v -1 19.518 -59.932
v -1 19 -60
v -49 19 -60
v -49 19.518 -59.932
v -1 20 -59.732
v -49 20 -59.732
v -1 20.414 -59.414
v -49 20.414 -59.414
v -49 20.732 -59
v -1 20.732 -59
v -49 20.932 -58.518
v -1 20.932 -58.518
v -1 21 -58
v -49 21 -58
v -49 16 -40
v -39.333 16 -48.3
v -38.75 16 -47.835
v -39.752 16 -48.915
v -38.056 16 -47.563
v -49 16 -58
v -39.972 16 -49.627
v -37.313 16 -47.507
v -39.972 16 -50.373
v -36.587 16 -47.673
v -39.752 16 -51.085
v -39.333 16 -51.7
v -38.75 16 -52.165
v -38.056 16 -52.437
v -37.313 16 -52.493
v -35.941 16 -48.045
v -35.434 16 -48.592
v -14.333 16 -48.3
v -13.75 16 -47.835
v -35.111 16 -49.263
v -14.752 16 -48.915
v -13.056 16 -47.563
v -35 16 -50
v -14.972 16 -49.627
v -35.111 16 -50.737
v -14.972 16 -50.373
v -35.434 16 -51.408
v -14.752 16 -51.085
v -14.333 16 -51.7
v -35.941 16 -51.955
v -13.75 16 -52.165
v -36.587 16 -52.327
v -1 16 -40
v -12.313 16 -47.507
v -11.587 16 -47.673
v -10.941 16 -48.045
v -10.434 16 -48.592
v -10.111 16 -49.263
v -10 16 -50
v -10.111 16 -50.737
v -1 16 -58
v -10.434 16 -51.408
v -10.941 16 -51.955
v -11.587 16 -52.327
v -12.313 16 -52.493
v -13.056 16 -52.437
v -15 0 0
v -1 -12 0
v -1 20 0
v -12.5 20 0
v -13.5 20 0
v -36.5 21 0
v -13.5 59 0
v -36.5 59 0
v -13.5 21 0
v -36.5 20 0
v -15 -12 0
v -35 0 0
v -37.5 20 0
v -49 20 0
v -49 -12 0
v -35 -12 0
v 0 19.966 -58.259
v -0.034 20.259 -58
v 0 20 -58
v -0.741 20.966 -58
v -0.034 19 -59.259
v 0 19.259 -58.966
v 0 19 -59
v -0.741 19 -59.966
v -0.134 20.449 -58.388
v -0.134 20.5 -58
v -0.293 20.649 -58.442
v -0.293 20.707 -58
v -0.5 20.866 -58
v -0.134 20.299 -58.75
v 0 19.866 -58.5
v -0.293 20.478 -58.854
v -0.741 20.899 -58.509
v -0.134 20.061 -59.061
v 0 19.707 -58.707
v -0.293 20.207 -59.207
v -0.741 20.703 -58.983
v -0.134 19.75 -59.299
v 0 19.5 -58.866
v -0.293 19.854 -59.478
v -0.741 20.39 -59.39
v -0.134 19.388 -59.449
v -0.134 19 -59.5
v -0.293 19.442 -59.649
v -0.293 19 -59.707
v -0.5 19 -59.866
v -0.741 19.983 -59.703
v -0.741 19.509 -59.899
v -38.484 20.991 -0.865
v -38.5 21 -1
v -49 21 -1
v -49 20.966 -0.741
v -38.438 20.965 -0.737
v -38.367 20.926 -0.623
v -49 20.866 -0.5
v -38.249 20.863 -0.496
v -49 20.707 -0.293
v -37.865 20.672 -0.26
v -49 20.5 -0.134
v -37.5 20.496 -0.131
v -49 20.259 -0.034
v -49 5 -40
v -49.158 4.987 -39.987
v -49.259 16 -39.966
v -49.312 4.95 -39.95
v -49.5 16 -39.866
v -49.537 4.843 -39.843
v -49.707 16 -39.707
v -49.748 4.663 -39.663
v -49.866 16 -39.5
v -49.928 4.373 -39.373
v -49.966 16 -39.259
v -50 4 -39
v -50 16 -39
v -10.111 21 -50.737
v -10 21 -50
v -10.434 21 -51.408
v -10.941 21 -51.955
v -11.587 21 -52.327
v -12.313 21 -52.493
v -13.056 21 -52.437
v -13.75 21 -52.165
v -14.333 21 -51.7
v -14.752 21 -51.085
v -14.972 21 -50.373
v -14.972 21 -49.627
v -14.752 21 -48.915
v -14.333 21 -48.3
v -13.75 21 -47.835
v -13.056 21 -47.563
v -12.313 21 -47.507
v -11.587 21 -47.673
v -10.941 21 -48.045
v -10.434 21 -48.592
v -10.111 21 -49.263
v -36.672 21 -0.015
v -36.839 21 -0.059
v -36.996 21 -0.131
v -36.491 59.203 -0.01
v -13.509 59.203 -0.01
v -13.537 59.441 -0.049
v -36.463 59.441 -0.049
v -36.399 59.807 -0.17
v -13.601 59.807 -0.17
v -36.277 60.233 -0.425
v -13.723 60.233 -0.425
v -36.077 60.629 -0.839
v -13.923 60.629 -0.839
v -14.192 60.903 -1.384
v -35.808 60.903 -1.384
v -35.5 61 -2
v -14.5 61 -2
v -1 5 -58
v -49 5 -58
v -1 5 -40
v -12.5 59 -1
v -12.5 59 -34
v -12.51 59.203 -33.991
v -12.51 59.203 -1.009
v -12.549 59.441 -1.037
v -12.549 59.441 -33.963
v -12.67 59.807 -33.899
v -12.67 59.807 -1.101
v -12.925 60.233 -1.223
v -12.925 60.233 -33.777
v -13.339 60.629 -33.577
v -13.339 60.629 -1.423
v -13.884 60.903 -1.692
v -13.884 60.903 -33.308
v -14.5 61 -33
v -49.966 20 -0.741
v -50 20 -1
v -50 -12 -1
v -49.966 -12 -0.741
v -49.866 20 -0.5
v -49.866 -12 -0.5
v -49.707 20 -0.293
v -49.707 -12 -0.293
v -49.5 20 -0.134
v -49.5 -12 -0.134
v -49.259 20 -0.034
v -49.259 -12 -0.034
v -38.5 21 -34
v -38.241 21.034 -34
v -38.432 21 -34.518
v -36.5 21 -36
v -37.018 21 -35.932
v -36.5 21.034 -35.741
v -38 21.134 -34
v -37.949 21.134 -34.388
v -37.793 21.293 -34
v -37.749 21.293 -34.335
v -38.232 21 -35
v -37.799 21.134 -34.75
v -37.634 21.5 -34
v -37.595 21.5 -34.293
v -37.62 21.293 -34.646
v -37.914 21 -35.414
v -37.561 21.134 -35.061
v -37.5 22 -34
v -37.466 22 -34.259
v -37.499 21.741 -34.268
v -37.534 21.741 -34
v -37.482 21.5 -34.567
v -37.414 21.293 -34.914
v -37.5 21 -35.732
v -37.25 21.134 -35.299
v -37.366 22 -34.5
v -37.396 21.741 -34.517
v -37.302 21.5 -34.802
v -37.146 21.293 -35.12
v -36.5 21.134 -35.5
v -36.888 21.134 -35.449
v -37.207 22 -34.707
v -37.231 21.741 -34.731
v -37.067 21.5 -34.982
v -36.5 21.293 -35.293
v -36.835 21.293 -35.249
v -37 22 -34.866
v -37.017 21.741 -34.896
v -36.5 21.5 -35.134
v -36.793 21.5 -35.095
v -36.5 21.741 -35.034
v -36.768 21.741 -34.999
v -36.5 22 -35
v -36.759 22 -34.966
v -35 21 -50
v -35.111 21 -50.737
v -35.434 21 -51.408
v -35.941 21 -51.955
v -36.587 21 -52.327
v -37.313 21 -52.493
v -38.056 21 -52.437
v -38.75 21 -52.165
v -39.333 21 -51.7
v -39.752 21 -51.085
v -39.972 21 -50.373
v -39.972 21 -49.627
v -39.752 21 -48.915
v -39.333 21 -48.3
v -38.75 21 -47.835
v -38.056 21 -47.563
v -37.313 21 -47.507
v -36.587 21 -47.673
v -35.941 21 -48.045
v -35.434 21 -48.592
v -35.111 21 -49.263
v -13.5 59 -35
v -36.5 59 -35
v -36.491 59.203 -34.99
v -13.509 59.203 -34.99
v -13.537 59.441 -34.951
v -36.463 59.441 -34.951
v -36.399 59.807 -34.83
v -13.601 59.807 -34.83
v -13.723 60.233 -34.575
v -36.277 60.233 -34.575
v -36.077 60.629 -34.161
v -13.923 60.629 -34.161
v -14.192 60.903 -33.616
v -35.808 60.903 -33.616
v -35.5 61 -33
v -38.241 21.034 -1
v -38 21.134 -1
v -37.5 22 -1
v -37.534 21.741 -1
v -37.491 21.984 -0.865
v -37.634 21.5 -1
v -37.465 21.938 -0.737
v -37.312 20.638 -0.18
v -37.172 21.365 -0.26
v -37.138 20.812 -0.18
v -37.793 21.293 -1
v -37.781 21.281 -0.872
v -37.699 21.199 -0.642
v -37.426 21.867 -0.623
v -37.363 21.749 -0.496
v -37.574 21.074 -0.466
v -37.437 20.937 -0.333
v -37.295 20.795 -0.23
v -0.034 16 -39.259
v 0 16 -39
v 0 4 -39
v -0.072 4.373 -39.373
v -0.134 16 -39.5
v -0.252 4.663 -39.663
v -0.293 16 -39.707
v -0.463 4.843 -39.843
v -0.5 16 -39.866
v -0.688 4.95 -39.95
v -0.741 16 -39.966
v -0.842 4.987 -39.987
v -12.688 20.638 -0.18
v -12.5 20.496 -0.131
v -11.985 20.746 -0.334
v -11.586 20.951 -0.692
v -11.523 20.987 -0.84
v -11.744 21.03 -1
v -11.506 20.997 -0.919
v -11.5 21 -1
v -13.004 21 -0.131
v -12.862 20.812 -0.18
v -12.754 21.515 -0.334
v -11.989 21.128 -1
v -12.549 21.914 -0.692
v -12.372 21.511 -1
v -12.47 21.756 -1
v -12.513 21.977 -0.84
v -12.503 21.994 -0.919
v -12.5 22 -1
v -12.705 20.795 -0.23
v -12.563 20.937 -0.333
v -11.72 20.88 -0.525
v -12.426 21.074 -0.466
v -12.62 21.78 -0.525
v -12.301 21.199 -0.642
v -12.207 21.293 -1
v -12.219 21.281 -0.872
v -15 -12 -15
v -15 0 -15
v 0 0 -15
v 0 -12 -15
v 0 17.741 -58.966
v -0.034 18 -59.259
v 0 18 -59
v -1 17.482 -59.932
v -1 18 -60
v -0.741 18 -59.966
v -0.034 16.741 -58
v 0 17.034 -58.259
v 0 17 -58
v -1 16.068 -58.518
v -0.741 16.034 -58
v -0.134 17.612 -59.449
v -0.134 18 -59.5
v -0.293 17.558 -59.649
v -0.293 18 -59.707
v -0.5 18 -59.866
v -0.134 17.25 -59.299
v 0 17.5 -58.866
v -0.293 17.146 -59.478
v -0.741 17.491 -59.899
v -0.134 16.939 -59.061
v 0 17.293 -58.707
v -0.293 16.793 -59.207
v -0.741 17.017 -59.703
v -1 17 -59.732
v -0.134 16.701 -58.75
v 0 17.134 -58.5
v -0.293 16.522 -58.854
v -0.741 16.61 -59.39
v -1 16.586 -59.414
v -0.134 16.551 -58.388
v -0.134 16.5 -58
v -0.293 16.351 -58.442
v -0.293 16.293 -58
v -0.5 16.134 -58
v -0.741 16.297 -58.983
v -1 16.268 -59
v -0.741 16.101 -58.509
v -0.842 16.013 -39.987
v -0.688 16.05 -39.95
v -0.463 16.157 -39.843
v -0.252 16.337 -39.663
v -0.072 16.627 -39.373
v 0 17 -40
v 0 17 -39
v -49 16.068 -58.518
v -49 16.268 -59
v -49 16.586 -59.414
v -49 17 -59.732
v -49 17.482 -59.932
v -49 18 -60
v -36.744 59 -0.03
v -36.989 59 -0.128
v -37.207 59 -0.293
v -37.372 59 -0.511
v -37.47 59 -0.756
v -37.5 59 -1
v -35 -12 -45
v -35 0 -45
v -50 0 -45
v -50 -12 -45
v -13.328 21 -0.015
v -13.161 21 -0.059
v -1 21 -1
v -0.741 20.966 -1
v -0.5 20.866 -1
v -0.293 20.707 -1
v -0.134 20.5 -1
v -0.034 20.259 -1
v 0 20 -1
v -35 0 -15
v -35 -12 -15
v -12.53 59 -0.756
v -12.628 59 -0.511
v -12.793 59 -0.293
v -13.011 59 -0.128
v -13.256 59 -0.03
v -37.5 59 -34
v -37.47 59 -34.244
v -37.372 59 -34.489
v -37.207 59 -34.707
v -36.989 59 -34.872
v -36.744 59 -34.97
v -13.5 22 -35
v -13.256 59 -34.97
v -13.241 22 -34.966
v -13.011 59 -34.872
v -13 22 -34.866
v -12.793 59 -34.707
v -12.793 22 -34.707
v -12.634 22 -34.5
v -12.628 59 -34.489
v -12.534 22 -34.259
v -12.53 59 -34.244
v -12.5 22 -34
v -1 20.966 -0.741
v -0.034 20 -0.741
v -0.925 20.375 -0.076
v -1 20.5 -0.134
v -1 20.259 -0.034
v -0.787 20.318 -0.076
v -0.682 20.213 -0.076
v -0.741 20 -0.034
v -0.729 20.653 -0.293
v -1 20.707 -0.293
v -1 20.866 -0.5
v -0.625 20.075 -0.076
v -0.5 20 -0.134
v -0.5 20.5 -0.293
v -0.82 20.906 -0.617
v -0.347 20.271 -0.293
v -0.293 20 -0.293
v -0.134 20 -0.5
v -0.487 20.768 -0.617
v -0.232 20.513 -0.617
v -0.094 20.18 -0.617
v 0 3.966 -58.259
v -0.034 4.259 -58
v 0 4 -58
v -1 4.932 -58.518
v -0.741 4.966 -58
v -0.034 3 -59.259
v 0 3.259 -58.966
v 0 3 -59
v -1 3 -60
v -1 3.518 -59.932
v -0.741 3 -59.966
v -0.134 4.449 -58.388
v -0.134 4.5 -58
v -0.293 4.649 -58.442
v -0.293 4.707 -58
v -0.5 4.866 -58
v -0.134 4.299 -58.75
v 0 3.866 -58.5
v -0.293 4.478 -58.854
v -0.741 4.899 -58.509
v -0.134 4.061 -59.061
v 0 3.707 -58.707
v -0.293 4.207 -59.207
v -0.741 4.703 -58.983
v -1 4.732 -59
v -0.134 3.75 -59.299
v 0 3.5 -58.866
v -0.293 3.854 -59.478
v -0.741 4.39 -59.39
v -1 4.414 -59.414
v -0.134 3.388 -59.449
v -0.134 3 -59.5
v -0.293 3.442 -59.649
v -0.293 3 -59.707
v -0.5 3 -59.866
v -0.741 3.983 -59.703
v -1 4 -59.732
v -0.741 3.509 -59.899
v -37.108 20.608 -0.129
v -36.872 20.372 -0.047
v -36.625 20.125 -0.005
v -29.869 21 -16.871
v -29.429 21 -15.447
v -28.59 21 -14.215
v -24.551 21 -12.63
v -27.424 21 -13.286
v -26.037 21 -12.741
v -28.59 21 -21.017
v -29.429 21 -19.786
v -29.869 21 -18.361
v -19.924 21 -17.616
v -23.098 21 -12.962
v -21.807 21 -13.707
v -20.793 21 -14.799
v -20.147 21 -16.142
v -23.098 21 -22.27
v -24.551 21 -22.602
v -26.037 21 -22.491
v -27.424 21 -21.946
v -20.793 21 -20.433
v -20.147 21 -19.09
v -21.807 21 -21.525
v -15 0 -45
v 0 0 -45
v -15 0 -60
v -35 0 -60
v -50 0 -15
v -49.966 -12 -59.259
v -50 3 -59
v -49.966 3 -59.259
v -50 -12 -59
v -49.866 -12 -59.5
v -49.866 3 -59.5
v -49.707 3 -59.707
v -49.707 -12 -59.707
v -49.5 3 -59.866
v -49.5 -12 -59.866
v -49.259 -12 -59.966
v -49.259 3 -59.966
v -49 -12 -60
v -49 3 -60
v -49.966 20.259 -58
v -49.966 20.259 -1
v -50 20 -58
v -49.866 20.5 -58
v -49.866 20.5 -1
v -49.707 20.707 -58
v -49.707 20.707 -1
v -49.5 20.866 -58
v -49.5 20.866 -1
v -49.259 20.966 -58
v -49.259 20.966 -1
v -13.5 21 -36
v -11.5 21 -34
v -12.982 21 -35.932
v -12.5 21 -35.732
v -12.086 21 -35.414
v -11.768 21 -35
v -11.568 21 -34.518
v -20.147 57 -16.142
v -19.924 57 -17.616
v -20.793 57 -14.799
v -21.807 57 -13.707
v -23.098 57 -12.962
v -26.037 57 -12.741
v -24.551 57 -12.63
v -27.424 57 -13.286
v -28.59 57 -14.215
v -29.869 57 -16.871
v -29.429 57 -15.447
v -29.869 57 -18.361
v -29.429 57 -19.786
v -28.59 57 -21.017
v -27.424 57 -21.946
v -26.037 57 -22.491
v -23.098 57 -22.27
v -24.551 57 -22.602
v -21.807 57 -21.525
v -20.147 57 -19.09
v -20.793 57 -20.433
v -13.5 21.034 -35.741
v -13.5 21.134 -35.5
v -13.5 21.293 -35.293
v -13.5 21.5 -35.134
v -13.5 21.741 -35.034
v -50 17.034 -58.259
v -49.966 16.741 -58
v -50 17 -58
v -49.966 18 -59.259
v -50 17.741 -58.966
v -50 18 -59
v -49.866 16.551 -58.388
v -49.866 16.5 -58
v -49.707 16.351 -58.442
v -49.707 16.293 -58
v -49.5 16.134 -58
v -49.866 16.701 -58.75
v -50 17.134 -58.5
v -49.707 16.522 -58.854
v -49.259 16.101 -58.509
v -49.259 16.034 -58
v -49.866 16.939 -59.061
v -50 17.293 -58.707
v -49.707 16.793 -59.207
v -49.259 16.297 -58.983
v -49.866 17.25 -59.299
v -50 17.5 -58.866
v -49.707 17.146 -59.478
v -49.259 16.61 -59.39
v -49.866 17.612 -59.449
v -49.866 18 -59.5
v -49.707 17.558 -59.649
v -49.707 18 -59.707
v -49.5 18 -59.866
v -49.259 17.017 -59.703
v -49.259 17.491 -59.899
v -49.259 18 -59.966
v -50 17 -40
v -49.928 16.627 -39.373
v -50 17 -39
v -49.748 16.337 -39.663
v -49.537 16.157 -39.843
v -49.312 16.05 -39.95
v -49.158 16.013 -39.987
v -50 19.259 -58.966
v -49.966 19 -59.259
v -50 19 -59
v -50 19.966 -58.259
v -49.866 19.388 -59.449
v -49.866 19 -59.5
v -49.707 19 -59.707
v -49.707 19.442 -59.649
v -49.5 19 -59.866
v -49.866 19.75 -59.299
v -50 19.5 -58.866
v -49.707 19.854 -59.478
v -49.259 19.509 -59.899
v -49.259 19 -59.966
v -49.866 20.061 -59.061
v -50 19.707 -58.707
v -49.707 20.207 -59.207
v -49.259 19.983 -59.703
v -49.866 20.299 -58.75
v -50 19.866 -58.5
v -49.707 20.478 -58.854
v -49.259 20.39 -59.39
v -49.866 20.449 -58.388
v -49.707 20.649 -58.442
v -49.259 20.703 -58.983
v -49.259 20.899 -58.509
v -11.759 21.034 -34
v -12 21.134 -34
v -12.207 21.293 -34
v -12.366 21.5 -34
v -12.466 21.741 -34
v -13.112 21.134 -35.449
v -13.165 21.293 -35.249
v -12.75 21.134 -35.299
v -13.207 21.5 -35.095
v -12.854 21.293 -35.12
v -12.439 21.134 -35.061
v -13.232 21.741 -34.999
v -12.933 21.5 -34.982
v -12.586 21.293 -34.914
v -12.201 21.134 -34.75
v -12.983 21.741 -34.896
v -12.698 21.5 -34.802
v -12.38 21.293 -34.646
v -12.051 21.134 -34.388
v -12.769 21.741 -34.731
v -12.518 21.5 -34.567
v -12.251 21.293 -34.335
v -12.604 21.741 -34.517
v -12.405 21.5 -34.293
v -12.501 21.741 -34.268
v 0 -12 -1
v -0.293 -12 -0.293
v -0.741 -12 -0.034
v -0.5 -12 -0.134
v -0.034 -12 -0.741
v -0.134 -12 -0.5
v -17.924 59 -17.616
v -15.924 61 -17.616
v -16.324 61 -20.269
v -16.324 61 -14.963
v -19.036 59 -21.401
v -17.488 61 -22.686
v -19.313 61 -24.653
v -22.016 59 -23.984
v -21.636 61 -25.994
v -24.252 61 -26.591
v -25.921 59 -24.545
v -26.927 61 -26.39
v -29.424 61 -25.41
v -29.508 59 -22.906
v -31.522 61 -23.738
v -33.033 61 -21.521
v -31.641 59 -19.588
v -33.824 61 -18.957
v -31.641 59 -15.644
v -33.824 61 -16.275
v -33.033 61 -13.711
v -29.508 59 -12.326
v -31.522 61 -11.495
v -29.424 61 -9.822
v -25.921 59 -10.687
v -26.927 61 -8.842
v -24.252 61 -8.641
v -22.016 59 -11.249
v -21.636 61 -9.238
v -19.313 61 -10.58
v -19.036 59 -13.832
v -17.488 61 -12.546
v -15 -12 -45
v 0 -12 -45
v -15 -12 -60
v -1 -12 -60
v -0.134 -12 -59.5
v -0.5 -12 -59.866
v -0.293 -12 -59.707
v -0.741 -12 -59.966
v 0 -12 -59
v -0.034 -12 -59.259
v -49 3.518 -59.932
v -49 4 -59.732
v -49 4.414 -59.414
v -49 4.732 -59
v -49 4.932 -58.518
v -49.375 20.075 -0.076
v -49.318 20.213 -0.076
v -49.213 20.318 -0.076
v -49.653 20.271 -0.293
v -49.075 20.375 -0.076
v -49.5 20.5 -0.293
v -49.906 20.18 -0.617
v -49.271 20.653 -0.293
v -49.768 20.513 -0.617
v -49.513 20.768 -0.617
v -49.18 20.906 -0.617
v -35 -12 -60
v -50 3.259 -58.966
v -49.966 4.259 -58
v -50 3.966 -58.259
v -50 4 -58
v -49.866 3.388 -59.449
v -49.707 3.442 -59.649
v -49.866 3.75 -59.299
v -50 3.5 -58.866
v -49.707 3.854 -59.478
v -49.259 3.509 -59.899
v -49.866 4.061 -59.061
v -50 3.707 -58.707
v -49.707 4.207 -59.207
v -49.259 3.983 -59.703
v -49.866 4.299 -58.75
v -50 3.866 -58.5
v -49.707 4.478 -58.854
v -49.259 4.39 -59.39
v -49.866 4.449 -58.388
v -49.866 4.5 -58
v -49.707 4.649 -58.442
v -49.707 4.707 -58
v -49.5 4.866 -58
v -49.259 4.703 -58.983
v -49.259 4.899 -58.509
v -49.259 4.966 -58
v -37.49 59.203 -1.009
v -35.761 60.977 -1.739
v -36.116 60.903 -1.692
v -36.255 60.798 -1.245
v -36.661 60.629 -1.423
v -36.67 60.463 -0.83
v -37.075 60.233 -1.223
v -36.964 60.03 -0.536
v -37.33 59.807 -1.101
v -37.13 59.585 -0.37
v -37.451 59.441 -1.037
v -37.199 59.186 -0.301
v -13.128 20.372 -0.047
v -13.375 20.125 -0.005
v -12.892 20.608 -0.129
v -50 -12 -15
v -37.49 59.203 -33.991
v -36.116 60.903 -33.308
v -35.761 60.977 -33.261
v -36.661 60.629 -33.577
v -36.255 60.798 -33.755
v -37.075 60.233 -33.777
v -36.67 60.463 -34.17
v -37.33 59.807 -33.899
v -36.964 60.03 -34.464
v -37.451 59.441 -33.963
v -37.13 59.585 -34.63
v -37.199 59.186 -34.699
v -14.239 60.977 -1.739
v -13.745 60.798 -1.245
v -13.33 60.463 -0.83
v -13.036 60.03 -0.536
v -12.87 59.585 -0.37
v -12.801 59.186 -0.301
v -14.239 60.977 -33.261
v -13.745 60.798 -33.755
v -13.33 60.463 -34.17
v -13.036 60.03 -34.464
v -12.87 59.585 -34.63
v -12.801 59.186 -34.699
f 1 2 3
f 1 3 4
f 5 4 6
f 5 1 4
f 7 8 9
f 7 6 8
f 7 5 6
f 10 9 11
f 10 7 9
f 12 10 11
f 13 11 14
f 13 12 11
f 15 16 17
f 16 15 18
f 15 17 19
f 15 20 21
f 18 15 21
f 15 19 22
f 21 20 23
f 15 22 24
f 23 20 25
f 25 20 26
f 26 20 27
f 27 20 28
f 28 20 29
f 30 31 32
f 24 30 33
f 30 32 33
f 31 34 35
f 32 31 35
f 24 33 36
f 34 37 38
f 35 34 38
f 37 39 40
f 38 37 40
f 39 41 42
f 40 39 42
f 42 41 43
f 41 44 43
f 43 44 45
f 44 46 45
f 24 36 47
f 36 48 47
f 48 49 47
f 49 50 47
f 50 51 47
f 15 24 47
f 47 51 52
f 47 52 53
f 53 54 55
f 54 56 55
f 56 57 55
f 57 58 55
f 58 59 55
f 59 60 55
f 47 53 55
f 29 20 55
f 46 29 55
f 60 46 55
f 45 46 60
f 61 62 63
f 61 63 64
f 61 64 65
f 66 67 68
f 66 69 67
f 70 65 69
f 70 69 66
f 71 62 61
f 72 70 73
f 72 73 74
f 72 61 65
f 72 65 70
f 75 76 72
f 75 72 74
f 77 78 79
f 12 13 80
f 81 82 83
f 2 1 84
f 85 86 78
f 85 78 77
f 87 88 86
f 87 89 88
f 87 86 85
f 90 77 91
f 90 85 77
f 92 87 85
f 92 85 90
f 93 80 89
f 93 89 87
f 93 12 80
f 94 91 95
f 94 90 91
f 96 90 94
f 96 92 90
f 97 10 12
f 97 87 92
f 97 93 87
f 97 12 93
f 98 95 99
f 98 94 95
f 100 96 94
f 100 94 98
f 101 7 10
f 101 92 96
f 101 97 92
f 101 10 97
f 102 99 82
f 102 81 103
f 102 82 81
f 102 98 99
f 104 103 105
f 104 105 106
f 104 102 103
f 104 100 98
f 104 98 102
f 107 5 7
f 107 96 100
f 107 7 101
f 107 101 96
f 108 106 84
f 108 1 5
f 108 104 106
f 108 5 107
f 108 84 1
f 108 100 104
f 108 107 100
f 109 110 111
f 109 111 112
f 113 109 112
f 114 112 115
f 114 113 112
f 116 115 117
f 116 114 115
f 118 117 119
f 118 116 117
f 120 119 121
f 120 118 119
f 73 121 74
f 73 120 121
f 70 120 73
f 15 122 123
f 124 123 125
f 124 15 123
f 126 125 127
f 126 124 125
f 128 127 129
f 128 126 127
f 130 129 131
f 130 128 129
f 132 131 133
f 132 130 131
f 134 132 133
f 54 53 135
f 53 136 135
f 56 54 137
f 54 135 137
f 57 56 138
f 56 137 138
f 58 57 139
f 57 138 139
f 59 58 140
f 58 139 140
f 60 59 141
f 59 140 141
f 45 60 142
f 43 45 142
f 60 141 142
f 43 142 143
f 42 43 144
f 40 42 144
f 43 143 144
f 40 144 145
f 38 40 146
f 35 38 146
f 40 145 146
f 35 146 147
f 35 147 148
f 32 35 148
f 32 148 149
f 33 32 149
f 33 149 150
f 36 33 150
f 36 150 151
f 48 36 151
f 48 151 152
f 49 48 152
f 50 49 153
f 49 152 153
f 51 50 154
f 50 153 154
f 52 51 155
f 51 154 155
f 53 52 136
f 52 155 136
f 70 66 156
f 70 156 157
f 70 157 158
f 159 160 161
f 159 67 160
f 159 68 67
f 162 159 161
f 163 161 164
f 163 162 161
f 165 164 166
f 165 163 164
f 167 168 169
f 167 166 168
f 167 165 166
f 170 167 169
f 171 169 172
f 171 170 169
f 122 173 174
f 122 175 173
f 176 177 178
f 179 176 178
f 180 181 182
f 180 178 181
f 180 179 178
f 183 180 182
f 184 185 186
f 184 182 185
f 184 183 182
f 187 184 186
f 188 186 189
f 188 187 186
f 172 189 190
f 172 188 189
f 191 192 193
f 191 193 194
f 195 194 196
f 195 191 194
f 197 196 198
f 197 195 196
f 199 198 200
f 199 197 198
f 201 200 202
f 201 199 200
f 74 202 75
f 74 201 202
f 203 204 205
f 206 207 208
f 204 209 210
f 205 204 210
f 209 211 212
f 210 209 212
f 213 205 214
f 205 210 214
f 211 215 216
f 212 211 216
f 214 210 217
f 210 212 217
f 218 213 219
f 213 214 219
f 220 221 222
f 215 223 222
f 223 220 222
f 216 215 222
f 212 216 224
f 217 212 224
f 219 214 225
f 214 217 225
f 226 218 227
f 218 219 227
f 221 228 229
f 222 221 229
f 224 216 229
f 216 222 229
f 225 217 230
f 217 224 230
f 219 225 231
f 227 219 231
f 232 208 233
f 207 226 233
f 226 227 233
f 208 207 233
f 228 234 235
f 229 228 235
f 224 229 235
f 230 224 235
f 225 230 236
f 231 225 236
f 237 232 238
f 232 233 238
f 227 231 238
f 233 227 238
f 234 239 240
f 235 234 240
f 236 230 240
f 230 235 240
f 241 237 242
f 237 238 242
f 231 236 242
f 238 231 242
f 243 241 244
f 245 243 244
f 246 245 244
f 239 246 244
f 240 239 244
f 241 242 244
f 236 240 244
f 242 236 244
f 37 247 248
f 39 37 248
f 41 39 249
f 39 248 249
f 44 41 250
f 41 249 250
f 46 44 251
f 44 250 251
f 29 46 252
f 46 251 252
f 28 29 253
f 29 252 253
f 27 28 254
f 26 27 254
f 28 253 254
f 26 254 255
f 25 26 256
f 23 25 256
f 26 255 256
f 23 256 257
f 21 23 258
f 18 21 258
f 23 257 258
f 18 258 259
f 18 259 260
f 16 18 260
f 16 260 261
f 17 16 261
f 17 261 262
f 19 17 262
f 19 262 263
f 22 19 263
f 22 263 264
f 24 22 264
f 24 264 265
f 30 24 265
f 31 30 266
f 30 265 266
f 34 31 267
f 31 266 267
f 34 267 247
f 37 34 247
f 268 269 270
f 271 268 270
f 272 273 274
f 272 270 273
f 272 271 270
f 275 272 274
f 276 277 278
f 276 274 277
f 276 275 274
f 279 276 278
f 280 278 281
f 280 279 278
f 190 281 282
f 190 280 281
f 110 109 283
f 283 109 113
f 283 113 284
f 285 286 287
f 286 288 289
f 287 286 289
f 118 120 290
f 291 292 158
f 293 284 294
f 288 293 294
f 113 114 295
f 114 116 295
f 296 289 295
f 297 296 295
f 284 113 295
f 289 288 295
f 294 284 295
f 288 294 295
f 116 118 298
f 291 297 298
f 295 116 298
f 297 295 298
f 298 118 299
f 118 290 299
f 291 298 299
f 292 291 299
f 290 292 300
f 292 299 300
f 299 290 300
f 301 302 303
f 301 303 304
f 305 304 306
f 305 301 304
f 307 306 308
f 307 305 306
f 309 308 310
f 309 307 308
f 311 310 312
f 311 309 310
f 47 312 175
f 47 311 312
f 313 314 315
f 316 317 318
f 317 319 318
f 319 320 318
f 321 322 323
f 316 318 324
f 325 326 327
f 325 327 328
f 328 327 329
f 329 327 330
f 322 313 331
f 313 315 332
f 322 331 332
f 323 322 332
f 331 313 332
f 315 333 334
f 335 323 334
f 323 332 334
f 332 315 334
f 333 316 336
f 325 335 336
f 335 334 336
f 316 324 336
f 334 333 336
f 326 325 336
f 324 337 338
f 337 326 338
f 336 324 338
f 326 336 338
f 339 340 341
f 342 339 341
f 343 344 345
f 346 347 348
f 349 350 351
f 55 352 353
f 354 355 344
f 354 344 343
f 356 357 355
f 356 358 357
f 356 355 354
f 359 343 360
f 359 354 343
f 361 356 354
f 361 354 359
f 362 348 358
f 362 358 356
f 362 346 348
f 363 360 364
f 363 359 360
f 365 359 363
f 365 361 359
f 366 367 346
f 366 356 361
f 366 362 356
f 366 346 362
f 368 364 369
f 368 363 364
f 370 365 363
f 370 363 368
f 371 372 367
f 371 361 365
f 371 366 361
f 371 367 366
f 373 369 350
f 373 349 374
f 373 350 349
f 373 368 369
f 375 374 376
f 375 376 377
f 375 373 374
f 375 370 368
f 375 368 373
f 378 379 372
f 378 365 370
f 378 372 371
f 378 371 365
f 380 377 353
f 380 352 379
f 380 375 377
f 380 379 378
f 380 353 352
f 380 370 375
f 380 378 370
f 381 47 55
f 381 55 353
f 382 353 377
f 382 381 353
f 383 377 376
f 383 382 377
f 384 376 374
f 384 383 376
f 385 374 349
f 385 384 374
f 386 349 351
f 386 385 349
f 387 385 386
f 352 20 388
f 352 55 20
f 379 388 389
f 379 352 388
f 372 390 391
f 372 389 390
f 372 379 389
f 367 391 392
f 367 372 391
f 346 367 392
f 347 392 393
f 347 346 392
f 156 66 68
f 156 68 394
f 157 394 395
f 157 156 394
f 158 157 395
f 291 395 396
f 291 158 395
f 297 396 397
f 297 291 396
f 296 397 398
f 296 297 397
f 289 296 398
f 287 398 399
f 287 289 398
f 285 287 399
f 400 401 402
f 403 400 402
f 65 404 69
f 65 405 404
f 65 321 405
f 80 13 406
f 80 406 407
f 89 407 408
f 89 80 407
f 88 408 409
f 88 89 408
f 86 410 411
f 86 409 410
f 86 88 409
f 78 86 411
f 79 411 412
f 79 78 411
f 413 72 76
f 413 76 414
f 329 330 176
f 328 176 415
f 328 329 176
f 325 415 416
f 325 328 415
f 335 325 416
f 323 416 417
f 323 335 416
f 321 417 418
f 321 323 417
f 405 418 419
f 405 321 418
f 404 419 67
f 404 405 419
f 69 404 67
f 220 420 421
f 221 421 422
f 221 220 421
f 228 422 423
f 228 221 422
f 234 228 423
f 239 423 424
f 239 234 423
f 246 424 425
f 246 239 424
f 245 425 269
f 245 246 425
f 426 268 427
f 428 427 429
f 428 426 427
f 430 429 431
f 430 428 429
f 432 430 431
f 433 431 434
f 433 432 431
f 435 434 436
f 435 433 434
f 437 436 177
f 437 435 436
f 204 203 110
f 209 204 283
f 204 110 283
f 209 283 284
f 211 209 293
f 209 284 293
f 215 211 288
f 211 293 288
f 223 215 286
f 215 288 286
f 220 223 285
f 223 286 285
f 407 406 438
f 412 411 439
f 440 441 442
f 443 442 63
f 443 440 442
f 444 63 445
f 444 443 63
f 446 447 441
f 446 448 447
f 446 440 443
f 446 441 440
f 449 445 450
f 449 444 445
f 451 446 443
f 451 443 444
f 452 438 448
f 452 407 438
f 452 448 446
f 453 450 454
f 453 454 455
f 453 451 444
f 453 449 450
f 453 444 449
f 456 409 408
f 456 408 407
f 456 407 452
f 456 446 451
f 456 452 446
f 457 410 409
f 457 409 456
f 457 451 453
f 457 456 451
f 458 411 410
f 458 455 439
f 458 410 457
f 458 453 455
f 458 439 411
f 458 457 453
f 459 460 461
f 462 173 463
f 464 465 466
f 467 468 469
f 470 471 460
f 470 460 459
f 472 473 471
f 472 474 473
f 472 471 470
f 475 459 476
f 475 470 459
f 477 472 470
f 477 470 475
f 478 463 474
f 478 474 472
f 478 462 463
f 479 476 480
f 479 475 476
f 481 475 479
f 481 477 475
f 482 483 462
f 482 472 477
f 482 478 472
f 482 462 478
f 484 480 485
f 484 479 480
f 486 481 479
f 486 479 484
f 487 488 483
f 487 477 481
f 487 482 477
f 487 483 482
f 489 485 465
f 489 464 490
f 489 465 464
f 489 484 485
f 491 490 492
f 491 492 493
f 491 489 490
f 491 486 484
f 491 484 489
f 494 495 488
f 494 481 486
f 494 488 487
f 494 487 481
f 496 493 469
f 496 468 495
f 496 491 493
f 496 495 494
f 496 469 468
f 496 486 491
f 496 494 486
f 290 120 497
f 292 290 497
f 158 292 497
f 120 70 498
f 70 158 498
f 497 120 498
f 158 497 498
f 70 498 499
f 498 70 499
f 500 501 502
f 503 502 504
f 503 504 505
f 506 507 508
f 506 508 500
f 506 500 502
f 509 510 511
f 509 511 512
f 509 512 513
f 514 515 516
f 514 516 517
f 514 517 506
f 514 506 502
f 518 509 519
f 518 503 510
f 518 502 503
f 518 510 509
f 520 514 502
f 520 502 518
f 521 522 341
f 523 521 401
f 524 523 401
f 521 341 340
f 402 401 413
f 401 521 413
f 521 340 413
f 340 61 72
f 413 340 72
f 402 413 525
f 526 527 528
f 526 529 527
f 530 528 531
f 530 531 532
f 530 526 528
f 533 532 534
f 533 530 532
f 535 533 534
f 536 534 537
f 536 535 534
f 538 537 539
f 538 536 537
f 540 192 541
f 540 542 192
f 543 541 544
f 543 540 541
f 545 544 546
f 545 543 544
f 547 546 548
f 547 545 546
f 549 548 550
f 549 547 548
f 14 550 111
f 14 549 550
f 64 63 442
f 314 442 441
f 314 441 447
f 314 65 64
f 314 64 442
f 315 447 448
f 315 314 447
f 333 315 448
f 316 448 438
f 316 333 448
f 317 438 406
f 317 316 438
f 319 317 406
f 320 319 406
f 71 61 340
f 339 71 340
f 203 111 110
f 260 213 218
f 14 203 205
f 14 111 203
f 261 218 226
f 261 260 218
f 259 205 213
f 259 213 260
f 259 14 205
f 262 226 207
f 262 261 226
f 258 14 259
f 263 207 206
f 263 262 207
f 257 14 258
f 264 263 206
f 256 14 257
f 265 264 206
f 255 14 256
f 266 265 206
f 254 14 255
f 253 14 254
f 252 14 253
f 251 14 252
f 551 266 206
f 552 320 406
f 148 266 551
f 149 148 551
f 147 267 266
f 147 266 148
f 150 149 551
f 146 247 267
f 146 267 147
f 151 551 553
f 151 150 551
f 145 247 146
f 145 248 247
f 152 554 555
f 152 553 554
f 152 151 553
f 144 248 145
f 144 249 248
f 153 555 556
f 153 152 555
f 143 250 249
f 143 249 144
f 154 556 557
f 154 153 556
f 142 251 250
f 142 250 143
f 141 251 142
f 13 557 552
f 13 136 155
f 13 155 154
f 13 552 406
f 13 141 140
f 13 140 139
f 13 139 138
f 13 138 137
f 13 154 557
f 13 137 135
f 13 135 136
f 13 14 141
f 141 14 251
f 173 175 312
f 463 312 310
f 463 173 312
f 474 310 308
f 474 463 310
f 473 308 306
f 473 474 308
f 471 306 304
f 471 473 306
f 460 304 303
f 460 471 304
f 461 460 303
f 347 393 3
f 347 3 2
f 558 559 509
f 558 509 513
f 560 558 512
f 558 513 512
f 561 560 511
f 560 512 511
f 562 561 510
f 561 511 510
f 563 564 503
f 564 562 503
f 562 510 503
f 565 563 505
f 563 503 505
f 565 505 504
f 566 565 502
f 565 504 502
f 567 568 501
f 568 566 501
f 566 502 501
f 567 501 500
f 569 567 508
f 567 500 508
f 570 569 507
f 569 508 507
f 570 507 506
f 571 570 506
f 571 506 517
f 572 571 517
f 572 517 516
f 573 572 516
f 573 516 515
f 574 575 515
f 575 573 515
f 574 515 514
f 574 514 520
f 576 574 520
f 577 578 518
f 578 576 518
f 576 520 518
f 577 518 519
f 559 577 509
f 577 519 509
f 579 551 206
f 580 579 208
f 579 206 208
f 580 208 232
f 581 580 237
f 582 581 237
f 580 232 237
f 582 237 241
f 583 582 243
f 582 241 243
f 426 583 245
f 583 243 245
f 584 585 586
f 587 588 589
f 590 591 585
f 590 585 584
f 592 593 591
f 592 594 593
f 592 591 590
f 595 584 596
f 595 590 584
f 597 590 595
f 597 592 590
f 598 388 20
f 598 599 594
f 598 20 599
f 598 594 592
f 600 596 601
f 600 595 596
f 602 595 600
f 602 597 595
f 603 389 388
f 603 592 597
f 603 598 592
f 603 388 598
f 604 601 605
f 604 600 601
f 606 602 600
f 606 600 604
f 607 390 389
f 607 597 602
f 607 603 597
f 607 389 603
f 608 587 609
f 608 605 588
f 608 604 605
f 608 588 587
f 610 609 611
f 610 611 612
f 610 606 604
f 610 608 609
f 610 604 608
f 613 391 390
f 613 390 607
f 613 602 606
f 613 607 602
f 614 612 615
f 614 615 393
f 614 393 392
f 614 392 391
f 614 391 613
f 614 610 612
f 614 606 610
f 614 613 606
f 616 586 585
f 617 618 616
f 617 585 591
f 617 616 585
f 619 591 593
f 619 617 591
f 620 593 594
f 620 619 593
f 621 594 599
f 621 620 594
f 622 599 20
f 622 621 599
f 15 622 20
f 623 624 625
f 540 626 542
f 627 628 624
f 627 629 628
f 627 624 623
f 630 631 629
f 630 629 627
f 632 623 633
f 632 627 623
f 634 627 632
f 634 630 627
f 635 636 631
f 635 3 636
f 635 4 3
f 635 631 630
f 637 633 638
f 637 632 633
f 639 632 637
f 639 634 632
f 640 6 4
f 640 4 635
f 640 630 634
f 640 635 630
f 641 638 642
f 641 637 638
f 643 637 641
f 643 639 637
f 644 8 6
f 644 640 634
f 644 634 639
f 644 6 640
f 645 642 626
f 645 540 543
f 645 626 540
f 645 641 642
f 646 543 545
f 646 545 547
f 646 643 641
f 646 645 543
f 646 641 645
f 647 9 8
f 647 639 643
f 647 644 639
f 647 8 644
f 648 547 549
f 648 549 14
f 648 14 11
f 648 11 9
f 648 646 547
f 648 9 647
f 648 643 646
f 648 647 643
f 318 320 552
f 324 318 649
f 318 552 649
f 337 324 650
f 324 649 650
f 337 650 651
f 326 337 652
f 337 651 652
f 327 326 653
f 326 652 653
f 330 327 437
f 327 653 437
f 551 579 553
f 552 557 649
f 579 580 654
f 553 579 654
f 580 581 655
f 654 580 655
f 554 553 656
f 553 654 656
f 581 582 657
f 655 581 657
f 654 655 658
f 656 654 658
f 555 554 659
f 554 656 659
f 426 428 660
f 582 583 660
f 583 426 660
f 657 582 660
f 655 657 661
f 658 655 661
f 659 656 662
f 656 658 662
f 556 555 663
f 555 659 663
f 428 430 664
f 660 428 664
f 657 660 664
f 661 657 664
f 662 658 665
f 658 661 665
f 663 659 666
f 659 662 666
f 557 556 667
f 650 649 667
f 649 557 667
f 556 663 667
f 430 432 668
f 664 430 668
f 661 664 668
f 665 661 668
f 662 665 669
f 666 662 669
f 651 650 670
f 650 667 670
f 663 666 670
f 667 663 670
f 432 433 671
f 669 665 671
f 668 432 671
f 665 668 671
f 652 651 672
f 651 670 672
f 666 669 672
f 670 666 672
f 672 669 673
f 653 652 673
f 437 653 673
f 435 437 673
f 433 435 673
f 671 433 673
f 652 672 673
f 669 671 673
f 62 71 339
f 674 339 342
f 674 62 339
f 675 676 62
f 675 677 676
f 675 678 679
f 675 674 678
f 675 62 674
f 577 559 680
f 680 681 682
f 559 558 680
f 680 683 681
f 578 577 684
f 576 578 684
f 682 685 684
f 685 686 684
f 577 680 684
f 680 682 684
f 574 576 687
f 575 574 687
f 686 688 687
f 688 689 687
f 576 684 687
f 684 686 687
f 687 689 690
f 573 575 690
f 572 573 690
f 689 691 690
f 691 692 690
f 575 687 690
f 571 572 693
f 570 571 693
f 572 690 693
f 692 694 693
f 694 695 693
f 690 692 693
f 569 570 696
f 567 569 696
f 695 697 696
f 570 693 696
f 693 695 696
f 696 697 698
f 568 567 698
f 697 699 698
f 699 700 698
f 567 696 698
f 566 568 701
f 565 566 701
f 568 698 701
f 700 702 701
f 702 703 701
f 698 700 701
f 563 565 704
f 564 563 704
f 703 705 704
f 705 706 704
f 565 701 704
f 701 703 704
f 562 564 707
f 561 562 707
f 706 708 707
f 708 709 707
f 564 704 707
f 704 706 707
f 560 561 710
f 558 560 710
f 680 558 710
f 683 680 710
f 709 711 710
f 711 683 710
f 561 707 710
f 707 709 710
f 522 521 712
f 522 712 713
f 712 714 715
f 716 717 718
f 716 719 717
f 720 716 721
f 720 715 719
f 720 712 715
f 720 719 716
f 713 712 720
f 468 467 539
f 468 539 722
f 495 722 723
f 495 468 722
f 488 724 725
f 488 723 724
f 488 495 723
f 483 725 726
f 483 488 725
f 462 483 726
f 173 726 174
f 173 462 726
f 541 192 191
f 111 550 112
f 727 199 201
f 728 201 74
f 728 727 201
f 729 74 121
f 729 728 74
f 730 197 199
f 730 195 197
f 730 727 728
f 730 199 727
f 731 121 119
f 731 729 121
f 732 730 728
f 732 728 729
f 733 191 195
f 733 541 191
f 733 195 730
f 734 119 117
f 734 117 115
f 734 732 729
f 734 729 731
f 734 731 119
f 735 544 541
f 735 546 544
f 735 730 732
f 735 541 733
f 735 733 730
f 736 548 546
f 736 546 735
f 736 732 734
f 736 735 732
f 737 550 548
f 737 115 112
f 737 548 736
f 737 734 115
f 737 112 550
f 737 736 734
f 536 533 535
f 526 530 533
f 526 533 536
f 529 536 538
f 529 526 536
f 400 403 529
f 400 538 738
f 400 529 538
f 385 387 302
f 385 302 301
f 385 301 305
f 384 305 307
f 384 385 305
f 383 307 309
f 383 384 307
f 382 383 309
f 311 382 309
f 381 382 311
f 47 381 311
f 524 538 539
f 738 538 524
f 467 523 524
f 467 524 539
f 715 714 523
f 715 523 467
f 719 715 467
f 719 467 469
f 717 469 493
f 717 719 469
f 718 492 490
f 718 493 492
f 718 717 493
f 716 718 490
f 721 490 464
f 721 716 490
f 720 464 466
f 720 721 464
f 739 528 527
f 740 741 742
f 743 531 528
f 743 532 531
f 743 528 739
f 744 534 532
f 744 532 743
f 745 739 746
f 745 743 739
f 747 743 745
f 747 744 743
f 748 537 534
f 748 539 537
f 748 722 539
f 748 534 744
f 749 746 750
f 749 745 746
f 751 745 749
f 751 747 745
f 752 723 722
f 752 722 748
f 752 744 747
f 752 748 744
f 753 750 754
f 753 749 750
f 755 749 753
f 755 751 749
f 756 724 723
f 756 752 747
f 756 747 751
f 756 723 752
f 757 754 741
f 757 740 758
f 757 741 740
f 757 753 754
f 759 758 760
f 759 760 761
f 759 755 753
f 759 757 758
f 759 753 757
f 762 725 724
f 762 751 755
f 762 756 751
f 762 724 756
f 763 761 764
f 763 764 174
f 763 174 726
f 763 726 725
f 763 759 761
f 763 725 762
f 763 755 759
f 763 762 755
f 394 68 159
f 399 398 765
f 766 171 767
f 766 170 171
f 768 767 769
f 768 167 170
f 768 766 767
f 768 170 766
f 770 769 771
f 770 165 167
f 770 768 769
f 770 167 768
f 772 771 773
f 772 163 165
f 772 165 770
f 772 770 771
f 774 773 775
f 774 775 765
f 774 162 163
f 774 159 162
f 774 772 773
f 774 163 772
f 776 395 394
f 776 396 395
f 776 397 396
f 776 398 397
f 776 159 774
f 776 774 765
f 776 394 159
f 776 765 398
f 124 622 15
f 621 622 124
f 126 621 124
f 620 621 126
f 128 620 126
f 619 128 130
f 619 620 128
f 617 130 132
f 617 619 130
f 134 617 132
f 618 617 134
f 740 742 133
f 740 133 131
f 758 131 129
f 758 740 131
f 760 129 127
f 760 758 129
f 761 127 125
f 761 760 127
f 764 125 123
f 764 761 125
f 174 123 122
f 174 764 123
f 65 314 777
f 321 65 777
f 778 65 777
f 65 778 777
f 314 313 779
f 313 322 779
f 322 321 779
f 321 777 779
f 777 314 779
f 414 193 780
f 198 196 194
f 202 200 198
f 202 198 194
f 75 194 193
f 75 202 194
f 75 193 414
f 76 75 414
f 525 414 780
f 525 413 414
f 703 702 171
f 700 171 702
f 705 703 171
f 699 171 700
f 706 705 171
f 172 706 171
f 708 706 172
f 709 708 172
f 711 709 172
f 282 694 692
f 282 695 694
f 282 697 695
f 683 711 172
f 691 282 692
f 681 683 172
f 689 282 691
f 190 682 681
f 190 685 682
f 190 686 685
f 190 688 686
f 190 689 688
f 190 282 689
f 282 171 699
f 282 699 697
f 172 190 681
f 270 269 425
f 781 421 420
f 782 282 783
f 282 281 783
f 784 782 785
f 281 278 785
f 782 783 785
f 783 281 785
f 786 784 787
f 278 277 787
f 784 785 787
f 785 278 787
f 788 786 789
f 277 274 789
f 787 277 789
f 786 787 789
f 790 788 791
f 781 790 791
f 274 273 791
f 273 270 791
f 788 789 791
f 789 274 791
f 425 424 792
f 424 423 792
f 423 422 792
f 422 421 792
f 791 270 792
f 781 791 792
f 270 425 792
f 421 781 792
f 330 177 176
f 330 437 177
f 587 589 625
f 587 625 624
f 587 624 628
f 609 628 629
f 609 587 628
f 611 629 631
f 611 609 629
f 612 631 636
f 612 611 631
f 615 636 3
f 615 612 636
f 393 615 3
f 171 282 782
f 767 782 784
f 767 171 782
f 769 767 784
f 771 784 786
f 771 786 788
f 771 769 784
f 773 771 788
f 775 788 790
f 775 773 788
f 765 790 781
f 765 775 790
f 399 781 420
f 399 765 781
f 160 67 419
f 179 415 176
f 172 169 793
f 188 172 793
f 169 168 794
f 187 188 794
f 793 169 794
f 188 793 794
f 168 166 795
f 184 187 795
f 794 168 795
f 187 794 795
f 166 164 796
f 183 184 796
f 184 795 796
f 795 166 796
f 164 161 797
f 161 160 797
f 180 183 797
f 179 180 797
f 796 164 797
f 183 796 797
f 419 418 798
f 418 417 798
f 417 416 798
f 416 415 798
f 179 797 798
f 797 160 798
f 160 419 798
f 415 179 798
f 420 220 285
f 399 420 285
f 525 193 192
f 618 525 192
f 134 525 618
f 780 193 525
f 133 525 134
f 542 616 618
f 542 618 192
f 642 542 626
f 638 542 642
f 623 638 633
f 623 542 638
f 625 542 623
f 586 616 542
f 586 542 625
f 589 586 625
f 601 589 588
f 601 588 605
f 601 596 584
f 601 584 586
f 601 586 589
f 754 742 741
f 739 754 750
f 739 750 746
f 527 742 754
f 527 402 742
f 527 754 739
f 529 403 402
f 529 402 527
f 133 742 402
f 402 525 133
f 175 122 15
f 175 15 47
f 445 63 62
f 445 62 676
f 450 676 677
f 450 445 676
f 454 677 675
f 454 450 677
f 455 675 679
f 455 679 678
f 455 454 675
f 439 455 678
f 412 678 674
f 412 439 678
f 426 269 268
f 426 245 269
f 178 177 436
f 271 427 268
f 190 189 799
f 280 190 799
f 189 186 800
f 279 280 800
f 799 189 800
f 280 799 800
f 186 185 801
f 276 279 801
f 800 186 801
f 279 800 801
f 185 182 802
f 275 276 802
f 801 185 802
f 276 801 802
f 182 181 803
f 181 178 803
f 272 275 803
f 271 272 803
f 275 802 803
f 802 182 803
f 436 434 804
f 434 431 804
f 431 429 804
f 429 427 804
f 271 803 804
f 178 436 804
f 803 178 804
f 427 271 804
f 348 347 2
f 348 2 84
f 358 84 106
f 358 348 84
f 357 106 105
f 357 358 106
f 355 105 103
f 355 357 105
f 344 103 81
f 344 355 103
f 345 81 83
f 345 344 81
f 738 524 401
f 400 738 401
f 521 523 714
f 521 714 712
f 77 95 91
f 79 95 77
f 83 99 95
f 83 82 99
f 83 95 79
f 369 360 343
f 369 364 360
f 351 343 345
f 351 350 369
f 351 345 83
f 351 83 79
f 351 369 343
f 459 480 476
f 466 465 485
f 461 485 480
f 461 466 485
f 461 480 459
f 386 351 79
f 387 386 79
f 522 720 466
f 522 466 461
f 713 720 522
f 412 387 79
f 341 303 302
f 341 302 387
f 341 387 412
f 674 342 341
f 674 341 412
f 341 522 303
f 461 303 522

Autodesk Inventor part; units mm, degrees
ref_plane "YZ Plane" through (0, 0, 0) normal (1, 0, 0) x (0, 1, 0)
ref_plane "XZ Plane" through (0, 0, 0) normal (0, 1, 0) x (-1, 0, 0)
ref_plane "XY Plane" through (0, 0, 0) normal (0, 0, 1) x (1, 0, 0)
sketch "Sketch1" plane through (0, 0, 0) normal (0, 1, 0) x (-1, 0, 0)
  line L0 (0, 0) -> (50, 0)
  line L1 (50, 0) -> (50, -60)
  line L2 (50, -60) -> (0, -60)
  line L3 (0, -60) -> (0, 0)
  dimension "d0" = 50
  dimension "d1" = 60
extrude "Extrusion1" add sketch "Sketch1" along normal blind 5
sketch "Sketch2" plane through (0, 5, 0) normal (0, 1, 0) x (1, 0, 0)
  line L0 (-50, 0) -> (0, 0) projected
  line L1 (-50, 60) -> (-50, 0) projected
  line L2 (0, 0) -> (-50, 0)
  line L3 (-50, 0) -> (-50, 40)
  line L4 (-50, 40) -> (0, 40)
  line L5 (0, 40) -> (0, 0)
  dimension "d4" = 40
extrude "Extrusion2" add sketch "Sketch2" along normal blind 11
sketch "Sketch3" plane through (0, 16, 0) normal (0, 1, 0) x (1, 0, 0)
  line L0 (0, 0) -> (-50, 0)
  line L1 (-50, 0) -> (-50, 60)
  line L2 (-50, 60) -> (0, 60)
  line L3 (0, 60) -> (0, 0)
extrude "Extrusion3" add sketch "Sketch3" along normal blind 5
sketch "Sketch4" plane through (0, 21, 0) normal (0, 1, 0) x (1, 0, 0)
  line L0 (0, 0) -> (0, 60) projected
  line L1 (-50, 40) -> (0, 40) projected
  line L2 (0, 60) -> (-50, 60)
  line L3 (-50, 60) -> (-50, 40)
  line L4 (-50, 40) -> (0, 40)
  line L5 (0, 40) -> (0, 60)
  line L6 (-50, 50) -> (0, 50)
  line L7 (-25, 50) -> (-50, 50)
  line L8 (-25, 50) -> (0, 50)
  circle A0 centre (-12.5, 50) radius 2.5
  circle A1 centre (-37.5, 50) radius 2.5
  dimension "d9" = 5
  dimension "d10" = 5
extrude "Extrusion4" cut sketch "Sketch4" against normal blind 5 contours A0 L6 | L6 A0 | A1 L6 | L6 A1
sketch "Sketch5" plane through (0, 21, 0) normal (0, 1, 0) x (1, 0, 0)
  line L0 (-50, 60) -> (-50, 0) projected
  line L1 (0, 0) -> (-50, 0)
  line L2 (-50, 0) -> (-50, 35)
  line L3 (-50, 35) -> (0, 35)
  line L4 (0, 35) -> (0, 0)
  line L5 (-37.5, 35) -> (-37.5, 0)
  line L6 (-12.5, 35) -> (-12.5, 0)
  dimension "d13" = 35
extrude "Extrusion5" add sketch "Sketch5" along normal blind 30 contours L3 L6 L1 L5
sketch "Sketch6" plane through (0, 51, 0) normal (0, 1, 0) x (1, 0, 0)
  line L0 (0, 0) -> (0, 60) projected
  line L1 (0, 0) -> (-49.8487, 0)
  line L2 (-49.8487, 0) -> (-49.8487, 35.2322)
  line L3 (-49.8487, 35.2322) -> (0, 35.2322)
  line L4 (0, 35.2322) -> (0, 0)
  line L5 (-49.8487, 17.6161) -> (0, 17.6161) construction
  line L6 (-24.9244, 0) -> (-24.9244, 35.2322) construction
  circle A0 centre (-24.9244, 17.6161) radius 5
  dimension "d16" = 10
extrude "Extrusion6" cut sketch "Sketch6" against normal blind 30 contours A0
sketch "Sketch7" plane through (0, 51, 0) normal (0, 1, 0) x (1, 0, 0)
  line L0 (-50, 35) -> (-50, 0) projected
  line L1 (0, 0) -> (-50, 0)
  line L2 (-50, 0) -> (-50, 35)
  line L3 (-50, 35) -> (0, 35)
  line L4 (0, 35) -> (0, 0)
  circle A0 centre (-24.9244, 17.6161) radius 5 projected
  circle A1 centre (-24.9244, 17.6161) radius 5
  line L5 (-37.5, 35) -> (-37.5, 0)
  line L6 (-12.5, 35) -> (-12.5, 0)
extrude "Extrusion7" add sketch "Sketch7" along normal blind 10 contours L3 L6 L1 L5
chamfer "Chamfer1" distance 4 angle 45 1 edges at (-29.9244, 61, -17.6161)
sketch "Sketch8" plane through (0, 0, 0) normal (0, -1, 0) x (1, 0, 0)
  point P0 (0, 0)
sketch "Sketch9" plane through (0, 0, 0) normal (0, -1, 0) x (1, 0, 0)
  line L0 (0, -60) -> (-50, -60) projected
  line L1 (0, -60) -> (-15, -60)
  line L2 (-15, -60) -> (-15, -45)
  line L3 (-15, -45) -> (0, -45)
  line L4 (0, -45) -> (0, -60)
  line L5 (-50, -60) -> (-50, 0) projected
  line L6 (-50, -60) -> (-35, -60)
  line L7 (-35, -60) -> (-35, -45)
  line L8 (-35, -45) -> (-50, -45)
  line L9 (-50, -45) -> (-50, -60)
  line L10 (0, 0) -> (-15, 0)
  line L11 (-15, 0) -> (-15, -15)
  line L12 (-15, -15) -> (0, -15)
  line L13 (0, -15) -> (0, 0)
  line L14 (-50, 0) -> (-35, 0)
  line L15 (-35, 0) -> (-35, -15)
  line L16 (-35, -15) -> (-50, -15)
  line L17 (-50, -15) -> (-50, 0)
  point P0 (-50, -35)
  dimension "d24" = 15
  dimension "d25" = 15
  dimension "d26" = 15
  dimension "d27" = 15
  dimension "d28" = 15
  dimension "d29" = 15
extrude "Extrusion8" add sketch "Sketch9" along normal blind 12
fillet "Fillet1" radius 2 7 edges at (-25, 61, -35) (-25, 61, 0) (-25, 21, -60) (-25, 16, -60) (-25, 5, -60) (-12.5, 61, -17.5) (-37.5, 61, -17.5)
fillet "Fillet2" radius 1 10 edges at (-50, 20.4142, -59.4142) (-50, 18.5, -60) (-50, 16.5858, -59.4142) (-50, 16, -49) (-50, 21, -29) (0, 20.4142, -59.4142) (0, 18.5, -60) (0, 16.5858, -59.4142) (0, 16, -49) (0, 21, -29)
fillet "Fillet3" radius 1 16 edges at (-49.7071, 20.7071, 0) (-50, 4, 0) (-43.25, 21, 0) (-0.2929, 20.7071, 0) (0, 4, 0) (-6.75, 21, 0) (-50, 4.4142, -59.4142) (-50, 5, -49) (-50, -4.5, -60) (0, 4.4142, -59.4142) (0, 5, -49) (0, -4.5, -60) (0, 16.5, -40) (0, 10.5, -40) (-50, 16.5, -40) (-50, 10.5, -40)
fillet "Fillet4" radius 1 15 edges at (-13.0858, 60.4142, -0.5858) (-12.5, 40, 0) (-12.5, 20.5, 0) (-36.9142, 60.4142, -0.5858) (-37.5, 20.5, 0) (-37.5, 40, 0) (-13.0858, 60.4142, -34.4142) (-12.5, 40, -35) (-36.9142, 60.4142, -34.4142) (-37.5, 40, -35) (-37.5, 20.7071, -0.2929) (-37.5, 21, -18) (-25, 21, -35) (-12.5, 20.7071, -0.2929) (-12.5, 21, -18)
properties part number "PortaHerramienta1"
